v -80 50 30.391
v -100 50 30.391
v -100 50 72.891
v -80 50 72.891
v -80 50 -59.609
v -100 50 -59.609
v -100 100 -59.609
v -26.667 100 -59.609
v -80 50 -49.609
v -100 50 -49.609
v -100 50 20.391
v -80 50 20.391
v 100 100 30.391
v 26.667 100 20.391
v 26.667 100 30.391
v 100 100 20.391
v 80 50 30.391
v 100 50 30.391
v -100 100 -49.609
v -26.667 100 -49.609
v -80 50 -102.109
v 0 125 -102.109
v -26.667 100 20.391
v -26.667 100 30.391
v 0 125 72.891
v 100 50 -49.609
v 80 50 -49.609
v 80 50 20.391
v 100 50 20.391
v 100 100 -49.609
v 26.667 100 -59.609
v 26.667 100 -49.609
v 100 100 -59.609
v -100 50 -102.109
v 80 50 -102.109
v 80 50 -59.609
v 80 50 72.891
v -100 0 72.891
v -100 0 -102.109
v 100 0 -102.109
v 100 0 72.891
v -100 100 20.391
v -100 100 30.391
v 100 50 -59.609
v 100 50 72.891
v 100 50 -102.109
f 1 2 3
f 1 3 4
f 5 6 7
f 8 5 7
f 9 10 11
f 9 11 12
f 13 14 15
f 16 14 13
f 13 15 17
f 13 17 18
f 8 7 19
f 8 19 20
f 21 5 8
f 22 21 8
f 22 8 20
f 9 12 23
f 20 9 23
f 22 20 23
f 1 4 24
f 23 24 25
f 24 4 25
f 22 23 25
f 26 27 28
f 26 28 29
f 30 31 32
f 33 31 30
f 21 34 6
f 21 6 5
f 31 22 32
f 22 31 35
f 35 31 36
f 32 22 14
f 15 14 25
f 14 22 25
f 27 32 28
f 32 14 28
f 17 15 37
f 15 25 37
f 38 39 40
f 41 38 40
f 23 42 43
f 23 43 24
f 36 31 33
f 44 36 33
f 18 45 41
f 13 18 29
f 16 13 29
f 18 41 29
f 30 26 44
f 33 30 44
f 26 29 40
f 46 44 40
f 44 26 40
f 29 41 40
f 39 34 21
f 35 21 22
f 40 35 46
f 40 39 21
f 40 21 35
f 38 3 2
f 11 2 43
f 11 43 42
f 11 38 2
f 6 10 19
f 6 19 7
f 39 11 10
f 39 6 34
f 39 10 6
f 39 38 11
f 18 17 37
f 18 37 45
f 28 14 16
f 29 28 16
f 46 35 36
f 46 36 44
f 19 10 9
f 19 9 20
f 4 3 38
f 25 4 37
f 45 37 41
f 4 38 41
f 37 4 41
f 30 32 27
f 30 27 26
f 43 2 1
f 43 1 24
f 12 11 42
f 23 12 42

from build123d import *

# Parameters (mm, degrees)
SKETCH1_W           = 200
SKETCH1_H           = 175
BOSS_EXTRUDE1_DEPTH = 50
BOSS_EXTRUDE2_DEPTH = 175
SKETCH4_W           = 200
SKETCH4_H           = 10
BOSS_EXTRUDE3_DEPTH = 50
SKETCH6_W           = 200
SKETCH6_H           = 10
BOSS_EXTRUDE4_DEPTH = 50


with BuildPart() as part:
    # Sketch1 → Boss-Extrude1 (new body)
    with BuildSketch(Plane(origin=(0, 0, 0), x_dir=(1, 0, 0), z_dir=(0, 1, 0))):
        with Locations((0, 14.608639935)):
            Rectangle(SKETCH1_W, SKETCH1_H)
    extrude(amount=BOSS_EXTRUDE1_DEPTH)

    # Sketch3 → Boss-Extrude2 (add)
    with BuildSketch(Plane.XY.offset(72.891360065)):
        Polygon((-80, 50), (0, 125), (80, 50), align=None)
    extrude(amount=-BOSS_EXTRUDE2_DEPTH)

    # Sketch4 → Boss-Extrude3 (add)
    with BuildSketch(Plane(origin=(0, 50, 0), x_dir=(1, 0, 0), z_dir=(0, 1, 0))):
        with Locations((0, 54.608639935)):
            Rectangle(SKETCH4_W, SKETCH4_H)
    extrude(amount=BOSS_EXTRUDE3_DEPTH)

    # Sketch6 → Boss-Extrude4 (add)
    with BuildSketch(Plane(origin=(0, 50, 0), x_dir=(1, 0, 0), z_dir=(0, 1, 0))):
        with Locations((0, -25.391360065)):
            Rectangle(SKETCH6_W, SKETCH6_H)
    extrude(amount=BOSS_EXTRUDE4_DEPTH)


solid = part.part
